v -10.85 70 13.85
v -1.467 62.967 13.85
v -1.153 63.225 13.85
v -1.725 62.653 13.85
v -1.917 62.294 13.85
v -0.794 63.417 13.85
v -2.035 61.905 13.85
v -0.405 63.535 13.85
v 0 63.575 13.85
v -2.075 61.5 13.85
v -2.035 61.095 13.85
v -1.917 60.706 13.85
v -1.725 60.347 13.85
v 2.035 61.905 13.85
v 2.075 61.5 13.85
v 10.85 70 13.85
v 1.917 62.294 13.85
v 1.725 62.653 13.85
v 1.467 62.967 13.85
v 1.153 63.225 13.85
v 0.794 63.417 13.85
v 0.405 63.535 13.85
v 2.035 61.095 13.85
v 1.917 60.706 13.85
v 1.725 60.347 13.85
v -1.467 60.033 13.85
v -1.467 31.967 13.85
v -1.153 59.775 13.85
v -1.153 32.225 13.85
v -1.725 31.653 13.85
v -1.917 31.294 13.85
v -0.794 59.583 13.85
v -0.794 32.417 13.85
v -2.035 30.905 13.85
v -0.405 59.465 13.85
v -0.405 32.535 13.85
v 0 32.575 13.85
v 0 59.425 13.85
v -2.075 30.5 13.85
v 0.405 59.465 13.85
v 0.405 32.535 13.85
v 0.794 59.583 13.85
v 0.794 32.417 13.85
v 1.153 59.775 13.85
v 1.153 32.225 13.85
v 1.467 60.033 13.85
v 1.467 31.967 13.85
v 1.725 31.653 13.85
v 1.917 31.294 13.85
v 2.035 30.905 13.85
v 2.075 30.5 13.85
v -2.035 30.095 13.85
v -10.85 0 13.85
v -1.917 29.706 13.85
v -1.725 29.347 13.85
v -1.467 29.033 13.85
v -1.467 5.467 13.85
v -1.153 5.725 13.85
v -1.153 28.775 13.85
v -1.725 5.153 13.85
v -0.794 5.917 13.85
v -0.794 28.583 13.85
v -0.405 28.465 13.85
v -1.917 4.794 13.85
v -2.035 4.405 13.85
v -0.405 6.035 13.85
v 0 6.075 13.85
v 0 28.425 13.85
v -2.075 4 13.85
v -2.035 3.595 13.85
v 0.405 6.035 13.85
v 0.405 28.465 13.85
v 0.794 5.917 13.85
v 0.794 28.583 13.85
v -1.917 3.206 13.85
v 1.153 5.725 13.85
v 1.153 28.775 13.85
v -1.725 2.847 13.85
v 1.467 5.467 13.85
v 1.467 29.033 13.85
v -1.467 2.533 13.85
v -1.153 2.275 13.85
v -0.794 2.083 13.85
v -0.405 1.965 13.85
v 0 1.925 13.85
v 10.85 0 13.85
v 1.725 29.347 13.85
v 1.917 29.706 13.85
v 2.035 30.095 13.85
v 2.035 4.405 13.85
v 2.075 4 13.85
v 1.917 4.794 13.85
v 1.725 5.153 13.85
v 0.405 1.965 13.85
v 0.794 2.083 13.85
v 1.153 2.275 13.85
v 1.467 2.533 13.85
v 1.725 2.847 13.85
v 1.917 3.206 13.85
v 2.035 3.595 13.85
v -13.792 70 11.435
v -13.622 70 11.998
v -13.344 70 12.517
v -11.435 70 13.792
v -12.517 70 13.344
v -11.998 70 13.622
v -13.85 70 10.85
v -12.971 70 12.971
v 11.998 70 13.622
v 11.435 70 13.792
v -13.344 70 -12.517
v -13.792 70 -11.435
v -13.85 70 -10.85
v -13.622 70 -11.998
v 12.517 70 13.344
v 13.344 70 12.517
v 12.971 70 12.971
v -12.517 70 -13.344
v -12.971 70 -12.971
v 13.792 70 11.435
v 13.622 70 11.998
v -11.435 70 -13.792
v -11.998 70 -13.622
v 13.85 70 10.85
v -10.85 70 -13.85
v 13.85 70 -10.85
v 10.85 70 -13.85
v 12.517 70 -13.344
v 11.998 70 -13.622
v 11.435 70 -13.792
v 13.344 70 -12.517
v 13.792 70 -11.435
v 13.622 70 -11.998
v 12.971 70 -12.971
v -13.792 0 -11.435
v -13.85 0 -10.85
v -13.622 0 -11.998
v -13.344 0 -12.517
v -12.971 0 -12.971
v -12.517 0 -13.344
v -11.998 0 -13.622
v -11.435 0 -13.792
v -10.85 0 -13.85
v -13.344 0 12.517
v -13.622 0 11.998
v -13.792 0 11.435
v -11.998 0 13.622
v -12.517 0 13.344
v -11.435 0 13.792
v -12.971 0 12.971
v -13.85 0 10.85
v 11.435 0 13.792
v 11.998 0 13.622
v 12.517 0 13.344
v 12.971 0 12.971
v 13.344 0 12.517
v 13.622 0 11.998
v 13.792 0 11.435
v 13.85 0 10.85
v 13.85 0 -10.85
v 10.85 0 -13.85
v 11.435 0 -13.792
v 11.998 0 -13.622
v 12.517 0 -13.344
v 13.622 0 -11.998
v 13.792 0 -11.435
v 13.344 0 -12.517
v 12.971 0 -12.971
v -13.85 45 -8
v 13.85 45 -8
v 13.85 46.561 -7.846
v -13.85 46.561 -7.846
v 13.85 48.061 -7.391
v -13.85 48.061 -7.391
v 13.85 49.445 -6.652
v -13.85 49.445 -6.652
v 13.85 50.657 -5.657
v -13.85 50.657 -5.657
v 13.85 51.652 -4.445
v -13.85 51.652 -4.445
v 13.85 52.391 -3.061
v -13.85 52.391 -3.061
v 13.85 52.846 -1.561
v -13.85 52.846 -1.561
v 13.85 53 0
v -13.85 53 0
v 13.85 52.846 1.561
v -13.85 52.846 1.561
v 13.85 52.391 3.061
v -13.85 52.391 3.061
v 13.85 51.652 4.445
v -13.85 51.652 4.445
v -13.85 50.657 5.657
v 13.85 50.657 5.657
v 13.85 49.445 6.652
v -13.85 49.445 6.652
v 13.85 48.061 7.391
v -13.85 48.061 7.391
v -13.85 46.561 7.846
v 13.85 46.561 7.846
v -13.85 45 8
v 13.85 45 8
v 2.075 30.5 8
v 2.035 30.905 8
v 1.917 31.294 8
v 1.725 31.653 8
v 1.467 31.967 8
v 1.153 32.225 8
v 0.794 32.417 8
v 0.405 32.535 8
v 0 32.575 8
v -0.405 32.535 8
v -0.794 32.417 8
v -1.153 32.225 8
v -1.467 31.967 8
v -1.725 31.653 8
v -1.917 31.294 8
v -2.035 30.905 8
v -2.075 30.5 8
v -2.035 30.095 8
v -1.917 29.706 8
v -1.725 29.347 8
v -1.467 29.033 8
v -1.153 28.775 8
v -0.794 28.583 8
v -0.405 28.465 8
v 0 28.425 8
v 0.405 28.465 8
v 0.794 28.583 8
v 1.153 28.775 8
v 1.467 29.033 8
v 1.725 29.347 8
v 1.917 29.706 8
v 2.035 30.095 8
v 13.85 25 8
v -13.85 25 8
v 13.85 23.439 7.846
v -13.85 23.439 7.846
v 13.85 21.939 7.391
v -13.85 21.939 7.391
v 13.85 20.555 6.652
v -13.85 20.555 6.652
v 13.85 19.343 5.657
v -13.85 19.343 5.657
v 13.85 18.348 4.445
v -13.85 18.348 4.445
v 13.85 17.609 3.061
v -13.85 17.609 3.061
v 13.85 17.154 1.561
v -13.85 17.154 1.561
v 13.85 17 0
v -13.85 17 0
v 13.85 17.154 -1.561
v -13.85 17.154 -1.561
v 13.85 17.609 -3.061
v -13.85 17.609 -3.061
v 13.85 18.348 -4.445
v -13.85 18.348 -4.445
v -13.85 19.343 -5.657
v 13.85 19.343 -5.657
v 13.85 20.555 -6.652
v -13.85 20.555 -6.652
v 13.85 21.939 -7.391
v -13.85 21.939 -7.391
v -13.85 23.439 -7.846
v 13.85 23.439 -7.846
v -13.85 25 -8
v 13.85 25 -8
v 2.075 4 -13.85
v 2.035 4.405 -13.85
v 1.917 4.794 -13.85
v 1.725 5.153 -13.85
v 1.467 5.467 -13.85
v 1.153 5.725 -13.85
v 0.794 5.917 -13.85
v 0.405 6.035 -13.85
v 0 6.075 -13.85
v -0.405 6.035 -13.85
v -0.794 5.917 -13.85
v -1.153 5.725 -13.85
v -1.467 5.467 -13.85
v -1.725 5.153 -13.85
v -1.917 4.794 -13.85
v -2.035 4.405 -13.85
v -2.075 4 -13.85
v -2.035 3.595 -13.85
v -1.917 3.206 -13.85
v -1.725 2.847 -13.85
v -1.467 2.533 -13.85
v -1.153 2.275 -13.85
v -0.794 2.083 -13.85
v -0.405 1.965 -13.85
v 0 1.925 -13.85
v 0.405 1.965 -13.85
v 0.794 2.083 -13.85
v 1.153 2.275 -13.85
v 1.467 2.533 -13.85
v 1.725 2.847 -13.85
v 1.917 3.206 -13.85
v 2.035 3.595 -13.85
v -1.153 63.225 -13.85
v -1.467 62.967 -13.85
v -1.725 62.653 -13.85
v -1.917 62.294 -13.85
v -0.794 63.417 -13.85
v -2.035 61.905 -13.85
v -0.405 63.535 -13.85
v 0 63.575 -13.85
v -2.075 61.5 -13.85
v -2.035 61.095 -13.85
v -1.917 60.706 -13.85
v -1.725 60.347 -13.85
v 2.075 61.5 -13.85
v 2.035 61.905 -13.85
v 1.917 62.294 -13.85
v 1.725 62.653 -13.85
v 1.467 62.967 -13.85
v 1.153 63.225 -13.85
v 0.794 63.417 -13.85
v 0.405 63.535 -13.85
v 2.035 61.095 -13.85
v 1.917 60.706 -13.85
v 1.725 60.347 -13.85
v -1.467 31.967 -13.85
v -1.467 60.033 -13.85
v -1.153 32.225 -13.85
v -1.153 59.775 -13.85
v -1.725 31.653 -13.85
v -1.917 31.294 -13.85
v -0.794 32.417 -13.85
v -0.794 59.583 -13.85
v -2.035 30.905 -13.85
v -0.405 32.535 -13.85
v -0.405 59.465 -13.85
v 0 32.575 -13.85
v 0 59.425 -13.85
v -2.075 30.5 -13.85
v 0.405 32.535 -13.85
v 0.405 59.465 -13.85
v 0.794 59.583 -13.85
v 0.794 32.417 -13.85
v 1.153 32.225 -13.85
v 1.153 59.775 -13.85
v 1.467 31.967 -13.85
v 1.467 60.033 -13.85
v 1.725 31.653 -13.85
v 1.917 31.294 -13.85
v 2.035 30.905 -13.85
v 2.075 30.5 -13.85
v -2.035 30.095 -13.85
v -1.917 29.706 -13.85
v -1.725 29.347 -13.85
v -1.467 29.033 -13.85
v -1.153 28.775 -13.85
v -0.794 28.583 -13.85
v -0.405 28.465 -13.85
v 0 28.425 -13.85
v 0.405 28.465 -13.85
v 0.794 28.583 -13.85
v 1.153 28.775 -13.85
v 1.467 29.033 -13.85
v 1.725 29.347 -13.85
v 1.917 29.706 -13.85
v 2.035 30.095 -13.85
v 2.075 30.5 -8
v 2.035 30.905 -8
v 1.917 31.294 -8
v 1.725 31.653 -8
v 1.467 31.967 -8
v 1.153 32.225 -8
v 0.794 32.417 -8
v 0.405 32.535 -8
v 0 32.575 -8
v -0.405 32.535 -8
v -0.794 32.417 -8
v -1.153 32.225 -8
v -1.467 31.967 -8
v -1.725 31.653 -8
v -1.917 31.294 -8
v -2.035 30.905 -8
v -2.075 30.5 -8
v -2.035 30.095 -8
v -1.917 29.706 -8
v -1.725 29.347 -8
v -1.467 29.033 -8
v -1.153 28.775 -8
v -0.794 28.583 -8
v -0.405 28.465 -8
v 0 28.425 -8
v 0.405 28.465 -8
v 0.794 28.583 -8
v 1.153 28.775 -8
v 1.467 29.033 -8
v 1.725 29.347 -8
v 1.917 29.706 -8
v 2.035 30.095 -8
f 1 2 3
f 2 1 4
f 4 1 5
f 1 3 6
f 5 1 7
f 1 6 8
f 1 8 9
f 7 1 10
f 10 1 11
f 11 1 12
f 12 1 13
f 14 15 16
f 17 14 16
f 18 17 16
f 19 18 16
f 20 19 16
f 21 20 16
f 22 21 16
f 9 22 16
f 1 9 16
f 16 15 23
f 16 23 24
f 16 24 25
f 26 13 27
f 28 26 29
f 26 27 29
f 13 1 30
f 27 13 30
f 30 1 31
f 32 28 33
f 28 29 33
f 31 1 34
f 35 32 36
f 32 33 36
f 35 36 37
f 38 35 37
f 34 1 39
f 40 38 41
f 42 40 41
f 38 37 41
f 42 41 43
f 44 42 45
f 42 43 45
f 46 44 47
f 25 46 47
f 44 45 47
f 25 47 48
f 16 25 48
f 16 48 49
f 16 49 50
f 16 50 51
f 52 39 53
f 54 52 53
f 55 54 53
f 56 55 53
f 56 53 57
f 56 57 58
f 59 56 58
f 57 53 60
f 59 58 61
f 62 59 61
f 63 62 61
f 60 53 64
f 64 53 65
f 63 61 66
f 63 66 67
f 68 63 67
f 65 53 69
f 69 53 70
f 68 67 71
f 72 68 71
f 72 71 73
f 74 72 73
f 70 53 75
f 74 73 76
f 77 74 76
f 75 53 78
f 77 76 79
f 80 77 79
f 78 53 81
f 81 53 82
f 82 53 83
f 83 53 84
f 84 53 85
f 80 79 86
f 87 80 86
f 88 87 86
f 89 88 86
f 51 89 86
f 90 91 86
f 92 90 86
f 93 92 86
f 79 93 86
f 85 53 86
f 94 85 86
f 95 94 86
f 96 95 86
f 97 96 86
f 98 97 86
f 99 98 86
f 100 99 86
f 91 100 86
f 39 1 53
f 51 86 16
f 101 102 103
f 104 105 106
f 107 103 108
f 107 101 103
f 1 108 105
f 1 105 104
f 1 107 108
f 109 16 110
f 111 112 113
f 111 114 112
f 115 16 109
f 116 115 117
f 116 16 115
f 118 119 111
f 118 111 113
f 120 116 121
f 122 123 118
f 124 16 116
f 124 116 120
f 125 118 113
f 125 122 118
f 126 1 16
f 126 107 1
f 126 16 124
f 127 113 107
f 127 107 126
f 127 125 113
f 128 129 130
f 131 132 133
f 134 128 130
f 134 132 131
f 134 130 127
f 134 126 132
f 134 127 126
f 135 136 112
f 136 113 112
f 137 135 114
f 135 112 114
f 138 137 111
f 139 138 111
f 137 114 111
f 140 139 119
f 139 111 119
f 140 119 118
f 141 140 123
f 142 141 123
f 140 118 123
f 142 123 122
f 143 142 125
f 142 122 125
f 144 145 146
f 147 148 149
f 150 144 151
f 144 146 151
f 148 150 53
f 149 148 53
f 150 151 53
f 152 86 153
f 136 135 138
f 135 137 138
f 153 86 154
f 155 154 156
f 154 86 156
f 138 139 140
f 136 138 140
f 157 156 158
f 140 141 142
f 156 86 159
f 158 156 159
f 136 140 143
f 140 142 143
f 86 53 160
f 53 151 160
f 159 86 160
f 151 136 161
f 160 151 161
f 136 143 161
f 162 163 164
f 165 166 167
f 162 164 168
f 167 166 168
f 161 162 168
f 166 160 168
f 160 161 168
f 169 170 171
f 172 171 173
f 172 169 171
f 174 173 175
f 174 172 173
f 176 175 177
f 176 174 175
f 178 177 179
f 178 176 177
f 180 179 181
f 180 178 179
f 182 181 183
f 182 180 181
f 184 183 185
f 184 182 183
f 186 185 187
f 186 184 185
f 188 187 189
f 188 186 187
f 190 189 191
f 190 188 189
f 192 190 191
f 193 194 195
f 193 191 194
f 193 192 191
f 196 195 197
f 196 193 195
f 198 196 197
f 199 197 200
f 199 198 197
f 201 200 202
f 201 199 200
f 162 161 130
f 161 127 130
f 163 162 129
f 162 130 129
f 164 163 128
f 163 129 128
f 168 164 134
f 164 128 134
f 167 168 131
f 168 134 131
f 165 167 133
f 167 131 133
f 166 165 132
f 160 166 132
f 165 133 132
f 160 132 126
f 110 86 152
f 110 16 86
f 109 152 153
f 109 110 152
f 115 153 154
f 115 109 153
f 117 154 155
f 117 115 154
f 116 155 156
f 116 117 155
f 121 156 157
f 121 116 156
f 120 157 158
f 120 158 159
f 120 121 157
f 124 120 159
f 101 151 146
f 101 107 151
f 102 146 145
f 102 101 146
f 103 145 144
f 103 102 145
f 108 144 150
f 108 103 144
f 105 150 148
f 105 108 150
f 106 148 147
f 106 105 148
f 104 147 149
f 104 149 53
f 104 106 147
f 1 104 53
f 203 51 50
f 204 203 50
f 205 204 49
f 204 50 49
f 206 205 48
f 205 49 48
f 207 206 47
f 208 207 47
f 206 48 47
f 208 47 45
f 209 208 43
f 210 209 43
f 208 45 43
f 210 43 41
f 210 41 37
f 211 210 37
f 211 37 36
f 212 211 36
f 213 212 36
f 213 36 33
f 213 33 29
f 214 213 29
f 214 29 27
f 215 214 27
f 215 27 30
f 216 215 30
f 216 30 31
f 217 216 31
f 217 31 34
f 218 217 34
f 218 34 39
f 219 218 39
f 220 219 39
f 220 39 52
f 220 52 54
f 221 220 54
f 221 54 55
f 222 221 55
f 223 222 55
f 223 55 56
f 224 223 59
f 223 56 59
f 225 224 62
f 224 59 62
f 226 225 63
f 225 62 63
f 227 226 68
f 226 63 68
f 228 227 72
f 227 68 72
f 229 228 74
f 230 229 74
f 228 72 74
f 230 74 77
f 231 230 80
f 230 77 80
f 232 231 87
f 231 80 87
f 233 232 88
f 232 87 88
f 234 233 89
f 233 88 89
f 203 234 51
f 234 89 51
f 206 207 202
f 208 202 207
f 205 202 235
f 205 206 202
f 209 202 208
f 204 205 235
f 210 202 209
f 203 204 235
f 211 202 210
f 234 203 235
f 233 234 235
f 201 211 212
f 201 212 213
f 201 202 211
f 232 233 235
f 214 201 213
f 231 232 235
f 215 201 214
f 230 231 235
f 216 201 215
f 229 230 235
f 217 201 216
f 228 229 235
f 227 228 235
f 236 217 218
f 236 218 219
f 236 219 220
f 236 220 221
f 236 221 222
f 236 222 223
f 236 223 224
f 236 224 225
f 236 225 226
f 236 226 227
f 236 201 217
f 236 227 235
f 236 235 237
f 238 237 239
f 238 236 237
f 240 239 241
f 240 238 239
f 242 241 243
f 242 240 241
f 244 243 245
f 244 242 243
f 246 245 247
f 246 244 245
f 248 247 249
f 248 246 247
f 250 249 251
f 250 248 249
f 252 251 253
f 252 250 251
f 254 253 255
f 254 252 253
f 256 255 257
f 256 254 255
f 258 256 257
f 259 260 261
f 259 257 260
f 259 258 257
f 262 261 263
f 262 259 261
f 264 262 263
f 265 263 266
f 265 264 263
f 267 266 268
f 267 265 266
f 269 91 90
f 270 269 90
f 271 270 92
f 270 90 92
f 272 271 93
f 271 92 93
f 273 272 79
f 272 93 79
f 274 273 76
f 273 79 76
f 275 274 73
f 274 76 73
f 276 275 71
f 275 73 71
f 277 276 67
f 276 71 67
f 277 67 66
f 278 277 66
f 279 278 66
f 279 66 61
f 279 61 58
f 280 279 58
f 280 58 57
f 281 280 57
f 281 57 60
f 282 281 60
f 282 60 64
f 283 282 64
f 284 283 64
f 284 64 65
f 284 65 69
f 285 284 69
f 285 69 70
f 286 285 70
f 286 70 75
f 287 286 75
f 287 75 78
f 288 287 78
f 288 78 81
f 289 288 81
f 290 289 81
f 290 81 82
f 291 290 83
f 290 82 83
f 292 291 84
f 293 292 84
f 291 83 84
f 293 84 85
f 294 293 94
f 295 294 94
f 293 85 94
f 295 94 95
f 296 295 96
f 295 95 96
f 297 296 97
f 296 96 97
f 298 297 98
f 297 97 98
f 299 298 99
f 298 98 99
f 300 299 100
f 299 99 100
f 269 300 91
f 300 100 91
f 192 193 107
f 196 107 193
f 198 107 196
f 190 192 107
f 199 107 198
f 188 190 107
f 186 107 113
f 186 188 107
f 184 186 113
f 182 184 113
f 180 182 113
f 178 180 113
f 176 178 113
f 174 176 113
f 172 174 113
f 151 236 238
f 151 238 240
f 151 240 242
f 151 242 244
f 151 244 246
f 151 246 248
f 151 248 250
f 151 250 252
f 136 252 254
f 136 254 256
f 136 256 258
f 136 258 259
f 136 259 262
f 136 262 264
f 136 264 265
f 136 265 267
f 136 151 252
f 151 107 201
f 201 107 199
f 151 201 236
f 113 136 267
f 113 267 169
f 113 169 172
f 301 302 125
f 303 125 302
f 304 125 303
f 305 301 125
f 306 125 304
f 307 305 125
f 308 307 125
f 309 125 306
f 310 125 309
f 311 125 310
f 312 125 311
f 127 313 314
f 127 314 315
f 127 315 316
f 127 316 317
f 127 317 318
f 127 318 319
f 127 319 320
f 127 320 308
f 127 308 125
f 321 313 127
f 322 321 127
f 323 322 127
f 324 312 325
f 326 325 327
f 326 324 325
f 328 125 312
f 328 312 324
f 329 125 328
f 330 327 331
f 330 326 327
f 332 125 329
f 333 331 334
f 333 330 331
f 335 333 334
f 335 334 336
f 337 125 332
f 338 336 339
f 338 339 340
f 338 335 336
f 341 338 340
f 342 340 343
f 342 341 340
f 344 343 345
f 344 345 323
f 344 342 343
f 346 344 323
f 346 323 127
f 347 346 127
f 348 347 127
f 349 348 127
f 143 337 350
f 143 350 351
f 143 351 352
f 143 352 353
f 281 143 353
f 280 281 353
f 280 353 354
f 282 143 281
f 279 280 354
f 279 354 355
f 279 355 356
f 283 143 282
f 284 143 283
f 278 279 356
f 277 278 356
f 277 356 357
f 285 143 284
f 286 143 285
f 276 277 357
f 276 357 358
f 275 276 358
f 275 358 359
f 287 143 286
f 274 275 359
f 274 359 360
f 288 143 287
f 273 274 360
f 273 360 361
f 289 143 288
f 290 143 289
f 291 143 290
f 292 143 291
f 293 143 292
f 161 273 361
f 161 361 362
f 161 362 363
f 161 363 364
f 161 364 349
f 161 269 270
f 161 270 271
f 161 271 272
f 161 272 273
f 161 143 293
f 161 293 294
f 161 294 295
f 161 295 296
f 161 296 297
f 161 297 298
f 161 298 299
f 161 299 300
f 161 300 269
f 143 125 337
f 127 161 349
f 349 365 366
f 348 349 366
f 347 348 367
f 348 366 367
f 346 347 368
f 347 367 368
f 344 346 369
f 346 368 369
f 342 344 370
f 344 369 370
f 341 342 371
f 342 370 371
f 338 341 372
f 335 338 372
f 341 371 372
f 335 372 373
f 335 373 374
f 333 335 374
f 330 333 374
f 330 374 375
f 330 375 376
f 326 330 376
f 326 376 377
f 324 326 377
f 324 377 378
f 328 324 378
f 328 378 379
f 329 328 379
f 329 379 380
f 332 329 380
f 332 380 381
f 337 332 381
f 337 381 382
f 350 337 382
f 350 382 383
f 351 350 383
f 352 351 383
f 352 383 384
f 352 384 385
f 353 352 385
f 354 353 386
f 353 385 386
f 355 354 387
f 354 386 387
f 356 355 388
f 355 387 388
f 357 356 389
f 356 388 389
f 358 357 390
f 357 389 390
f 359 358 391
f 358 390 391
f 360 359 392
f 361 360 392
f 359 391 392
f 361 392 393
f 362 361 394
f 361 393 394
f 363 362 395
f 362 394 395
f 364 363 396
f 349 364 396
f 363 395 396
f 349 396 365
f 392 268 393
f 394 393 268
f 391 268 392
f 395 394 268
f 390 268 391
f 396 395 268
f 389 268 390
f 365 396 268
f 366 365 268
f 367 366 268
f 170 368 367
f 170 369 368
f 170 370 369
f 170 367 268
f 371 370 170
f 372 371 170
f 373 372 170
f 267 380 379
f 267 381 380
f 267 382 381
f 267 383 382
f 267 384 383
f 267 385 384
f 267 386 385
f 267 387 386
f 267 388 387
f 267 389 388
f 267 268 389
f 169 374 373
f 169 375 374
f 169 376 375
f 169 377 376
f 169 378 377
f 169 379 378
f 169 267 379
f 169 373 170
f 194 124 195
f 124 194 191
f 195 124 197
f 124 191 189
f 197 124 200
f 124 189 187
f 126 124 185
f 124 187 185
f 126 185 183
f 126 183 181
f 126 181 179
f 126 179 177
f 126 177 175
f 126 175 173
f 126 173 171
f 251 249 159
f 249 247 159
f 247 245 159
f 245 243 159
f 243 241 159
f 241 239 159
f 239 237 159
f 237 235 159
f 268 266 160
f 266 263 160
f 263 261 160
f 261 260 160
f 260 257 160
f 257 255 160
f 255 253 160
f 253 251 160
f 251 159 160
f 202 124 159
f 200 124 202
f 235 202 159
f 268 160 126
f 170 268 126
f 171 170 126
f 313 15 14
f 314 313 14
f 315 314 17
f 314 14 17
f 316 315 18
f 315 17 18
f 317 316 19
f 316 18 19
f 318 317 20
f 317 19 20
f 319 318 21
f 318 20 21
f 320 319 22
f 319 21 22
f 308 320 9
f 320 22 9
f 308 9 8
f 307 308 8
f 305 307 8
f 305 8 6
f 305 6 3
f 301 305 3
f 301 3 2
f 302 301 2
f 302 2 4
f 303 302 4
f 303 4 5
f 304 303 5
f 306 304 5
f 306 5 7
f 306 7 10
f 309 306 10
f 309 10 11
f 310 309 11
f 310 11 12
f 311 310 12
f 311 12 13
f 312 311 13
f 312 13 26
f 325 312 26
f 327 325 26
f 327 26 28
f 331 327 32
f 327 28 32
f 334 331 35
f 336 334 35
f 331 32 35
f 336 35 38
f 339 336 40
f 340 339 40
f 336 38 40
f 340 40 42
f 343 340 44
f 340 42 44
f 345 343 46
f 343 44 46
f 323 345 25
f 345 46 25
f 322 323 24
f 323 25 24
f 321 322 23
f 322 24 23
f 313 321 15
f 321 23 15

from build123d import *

# Parameters (mm, degrees)
SKETCH_1_W          = 27.7
SKETCH_1_H          = 27.7
EXTRUDE_1_DEPTH     = 70
SKETCH_2_R          = 2.075
CUT_EXTRUDE_1_DEPTH = 70
CUT_EXTRUDE_2_DEPTH = 70
FILLET_1_R          = 3


with BuildPart() as part:
    # 草图1 → 凸台-拉伸1 (new body)
    with BuildSketch(Plane(origin=(0, 0, 0), x_dir=(1, 0, 0), z_dir=(0, 1, 0))):
        Rectangle(SKETCH_1_W, SKETCH_1_H)
    extrude(amount=EXTRUDE_1_DEPTH)

    # 草图2 → 切除-拉伸1 (cut)
    with BuildSketch(Plane.XY.offset(13.85)):
        with Locations((0, 4)):
            Circle(SKETCH_2_R)
        with Locations((0, 30.5)):
            Circle(SKETCH_2_R)
        with Locations((0, 61.5)):
            Circle(SKETCH_2_R)
    extrude(amount=-CUT_EXTRUDE_1_DEPTH, mode=Mode.SUBTRACT)

    # 草图3 → 切除-拉伸2 (cut)
    with BuildSketch(Plane.ZY.offset(13.85)):
        with BuildLine():
            Line((-8, 25), (-8, 45))
            ThreePointArc((-8, 45), (0, 53), (8, 45))
            Line((8, 45), (8, 25))
            ThreePointArc((8, 25), (0, 17), (-8, 25))
        make_face()
    extrude(amount=-CUT_EXTRUDE_2_DEPTH, mode=Mode.SUBTRACT)

    # 圆角1
    fillet_1_edges = [part.edges().sort_by_distance(p)[0] for p in [
        (13.85, 35, 13.85),
        (-13.85, 35, 13.85),
        (-13.85, 35, -13.85),
        (13.85, 35, -13.85),
    ]]
    fillet(fillet_1_edges, radius=FILLET_1_R)


solid = part.part
